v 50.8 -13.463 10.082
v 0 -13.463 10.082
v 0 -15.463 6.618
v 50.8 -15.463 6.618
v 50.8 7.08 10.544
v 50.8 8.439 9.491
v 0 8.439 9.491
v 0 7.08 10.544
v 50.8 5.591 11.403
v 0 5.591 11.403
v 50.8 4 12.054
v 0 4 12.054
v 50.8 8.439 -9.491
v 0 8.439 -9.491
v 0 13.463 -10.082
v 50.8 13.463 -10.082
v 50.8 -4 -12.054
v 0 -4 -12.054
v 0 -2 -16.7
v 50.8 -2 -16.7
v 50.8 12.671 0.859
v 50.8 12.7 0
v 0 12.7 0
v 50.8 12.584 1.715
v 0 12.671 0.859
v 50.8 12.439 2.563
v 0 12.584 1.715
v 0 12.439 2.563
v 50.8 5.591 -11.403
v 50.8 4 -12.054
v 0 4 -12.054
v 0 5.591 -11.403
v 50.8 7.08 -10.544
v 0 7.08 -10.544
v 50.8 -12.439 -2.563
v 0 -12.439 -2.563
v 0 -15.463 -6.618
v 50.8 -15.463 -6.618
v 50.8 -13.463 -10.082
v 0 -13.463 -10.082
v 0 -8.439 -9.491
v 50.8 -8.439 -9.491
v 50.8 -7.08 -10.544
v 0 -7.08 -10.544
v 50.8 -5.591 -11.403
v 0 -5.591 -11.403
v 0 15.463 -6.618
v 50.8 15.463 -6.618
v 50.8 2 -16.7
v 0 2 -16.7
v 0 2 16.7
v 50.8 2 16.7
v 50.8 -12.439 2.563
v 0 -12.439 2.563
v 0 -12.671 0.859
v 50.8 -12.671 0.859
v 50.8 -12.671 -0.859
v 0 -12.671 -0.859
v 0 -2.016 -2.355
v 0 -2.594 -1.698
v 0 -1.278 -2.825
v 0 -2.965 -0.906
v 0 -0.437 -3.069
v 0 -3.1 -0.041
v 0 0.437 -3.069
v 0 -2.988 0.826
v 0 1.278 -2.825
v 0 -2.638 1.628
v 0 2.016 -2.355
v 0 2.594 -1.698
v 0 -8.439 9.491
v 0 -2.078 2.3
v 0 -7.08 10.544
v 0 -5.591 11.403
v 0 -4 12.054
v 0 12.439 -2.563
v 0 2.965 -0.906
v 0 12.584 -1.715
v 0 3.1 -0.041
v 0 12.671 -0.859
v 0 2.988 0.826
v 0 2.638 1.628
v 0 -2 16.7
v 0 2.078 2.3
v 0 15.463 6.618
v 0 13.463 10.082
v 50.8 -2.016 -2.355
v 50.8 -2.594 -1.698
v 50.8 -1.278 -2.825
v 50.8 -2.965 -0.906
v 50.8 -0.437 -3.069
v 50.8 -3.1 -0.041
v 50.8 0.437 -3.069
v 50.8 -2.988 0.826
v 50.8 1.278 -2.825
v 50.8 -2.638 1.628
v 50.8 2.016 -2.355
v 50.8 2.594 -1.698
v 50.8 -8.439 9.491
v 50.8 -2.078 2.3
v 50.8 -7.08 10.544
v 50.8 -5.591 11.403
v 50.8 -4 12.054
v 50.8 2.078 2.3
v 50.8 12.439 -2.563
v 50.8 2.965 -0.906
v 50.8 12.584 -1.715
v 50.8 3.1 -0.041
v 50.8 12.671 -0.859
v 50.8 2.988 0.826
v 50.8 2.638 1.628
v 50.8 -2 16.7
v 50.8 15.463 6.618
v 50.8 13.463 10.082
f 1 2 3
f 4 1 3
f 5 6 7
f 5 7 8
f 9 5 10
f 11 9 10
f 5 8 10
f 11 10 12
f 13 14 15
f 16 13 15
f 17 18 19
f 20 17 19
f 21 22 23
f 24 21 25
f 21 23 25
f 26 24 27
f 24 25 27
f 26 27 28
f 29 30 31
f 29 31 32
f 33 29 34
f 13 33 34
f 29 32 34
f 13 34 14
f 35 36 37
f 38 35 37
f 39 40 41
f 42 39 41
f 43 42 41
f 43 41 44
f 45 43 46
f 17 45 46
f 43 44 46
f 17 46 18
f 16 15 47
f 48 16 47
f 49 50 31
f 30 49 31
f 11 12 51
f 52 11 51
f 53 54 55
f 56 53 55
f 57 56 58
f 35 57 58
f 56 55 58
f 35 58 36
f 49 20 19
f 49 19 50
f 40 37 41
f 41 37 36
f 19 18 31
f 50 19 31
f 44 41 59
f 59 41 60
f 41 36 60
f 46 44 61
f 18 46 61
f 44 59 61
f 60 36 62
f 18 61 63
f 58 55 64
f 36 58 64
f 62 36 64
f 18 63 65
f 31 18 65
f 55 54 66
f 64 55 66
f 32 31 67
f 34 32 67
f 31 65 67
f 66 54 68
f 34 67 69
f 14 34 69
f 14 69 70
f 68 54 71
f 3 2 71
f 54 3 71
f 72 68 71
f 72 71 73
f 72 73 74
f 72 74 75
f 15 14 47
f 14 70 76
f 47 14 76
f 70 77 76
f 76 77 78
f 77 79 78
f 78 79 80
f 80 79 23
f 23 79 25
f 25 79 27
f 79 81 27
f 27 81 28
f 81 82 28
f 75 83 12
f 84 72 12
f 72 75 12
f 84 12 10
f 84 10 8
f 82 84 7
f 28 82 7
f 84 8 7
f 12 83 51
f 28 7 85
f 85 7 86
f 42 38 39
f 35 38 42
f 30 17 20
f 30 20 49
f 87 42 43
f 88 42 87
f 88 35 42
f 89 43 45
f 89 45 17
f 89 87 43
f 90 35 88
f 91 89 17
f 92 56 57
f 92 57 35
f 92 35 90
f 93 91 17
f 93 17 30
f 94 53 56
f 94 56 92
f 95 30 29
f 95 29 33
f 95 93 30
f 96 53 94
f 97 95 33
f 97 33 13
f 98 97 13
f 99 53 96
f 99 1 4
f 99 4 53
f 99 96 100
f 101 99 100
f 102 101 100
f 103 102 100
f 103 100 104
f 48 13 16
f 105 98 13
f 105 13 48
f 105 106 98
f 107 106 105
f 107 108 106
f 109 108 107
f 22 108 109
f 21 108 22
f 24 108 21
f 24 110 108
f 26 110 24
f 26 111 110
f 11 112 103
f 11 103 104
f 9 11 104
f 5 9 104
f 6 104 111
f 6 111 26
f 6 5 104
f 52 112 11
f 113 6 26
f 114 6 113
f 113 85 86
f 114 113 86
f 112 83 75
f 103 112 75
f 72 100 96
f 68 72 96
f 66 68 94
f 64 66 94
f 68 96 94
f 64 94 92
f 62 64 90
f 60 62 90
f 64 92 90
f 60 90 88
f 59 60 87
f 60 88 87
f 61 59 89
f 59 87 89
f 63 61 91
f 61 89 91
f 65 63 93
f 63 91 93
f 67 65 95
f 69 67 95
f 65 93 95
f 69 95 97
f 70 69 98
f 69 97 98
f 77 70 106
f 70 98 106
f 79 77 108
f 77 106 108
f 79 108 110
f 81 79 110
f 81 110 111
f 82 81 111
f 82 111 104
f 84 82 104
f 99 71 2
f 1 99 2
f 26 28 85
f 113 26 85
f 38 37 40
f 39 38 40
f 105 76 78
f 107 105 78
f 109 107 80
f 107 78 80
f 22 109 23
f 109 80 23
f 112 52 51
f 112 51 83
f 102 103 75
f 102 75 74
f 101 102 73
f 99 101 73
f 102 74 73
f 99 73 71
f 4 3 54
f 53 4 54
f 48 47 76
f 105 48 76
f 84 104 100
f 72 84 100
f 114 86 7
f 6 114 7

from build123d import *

# Parameters (mm, degrees)
F1_DEPTH = 50.8
F3_DEPTH = 101.6


with BuildPart() as f1:
    # F0 (on Right) → F1 (new body)
    with BuildSketch(Plane.YZ):
        with BuildLine():
            ThreePointArc((12.43875, -2.562713), (12.634519, -1.287998), (12.7, 0))
            ThreePointArc((12.7, 0), (12.634519, 1.287998), (12.43875, 2.562713))
            ThreePointArc((12.43875, 2.562713), (10.998523, 6.35), (8.43875, 9.490917))
            ThreePointArc((8.43875, 9.490917), (6.35, 10.998523), (4, 12.05363))
            ThreePointArc((4, 12.05363), (0, 12.7), (-4, 12.05363))
            ThreePointArc((-4, 12.05363), (-6.35, 10.998523), (-8.43875, 9.490917))
            ThreePointArc((-8.43875, 9.490917), (-10.998523, 6.35), (-12.43875, 2.562713))
            ThreePointArc((-12.43875, 2.562713), (-12.7, 0), (-12.43875, -2.562713))
            ThreePointArc((-12.43875, -2.562713), (-10.998523, -6.35), (-8.43875, -9.490917))
            ThreePointArc((-8.43875, -9.490917), (-6.35, -10.998523), (-4, -12.05363))
            ThreePointArc((-4, -12.05363), (0, -12.7), (4, -12.05363))
            ThreePointArc((4, -12.05363), (6.35, -10.998523), (8.43875, -9.490917))
            ThreePointArc((8.43875, -9.490917), (10.998523, -6.35), (12.43875, -2.562713))
        make_face()
        with BuildLine():
            ThreePointArc((8.43875, 9.490917), (10.998523, 6.35), (12.43875, 2.562713))
            Line((12.43875, 2.562713), (15.462624, 6.617949))
            Line((15.462624, 6.617949), (14.462624, 8.35))
            Line((14.462624, 8.35), (13.462624, 10.082051))
            Line((13.462624, 10.082051), (8.43875, 9.490917))
        make_face()
        with BuildLine():
            Line((15.462624, -6.617949), (12.43875, -2.562713))
            ThreePointArc((12.43875, -2.562713), (10.998523, -6.35), (8.43875, -9.490917))
            Line((8.43875, -9.490917), (13.462624, -10.082051))
            Line((13.462624, -10.082051), (14.462624, -8.35))
            Line((14.462624, -8.35), (15.462624, -6.617949))
        make_face()
        with BuildLine():
            ThreePointArc((-4, 12.05363), (0, 12.7), (4, 12.05363))
            Line((4, 12.05363), (2, 16.7))
            Line((2, 16.7), (0, 16.7))
            Line((0, 16.7), (-2, 16.7))
            Line((-2, 16.7), (-4, 12.05363))
        make_face()
        with BuildLine():
            Line((2, -16.7), (4, -12.05363))
            ThreePointArc((4, -12.05363), (0, -12.7), (-4, -12.05363))
            Line((-4, -12.05363), (-2, -16.7))
            Line((-2, -16.7), (0, -16.7))
            Line((0, -16.7), (2, -16.7))
        make_face()
        with BuildLine():
            ThreePointArc((-12.43875, 2.562713), (-10.998523, 6.35), (-8.43875, 9.490917))
            Line((-8.43875, 9.490917), (-13.462624, 10.082051))
            Line((-13.462624, 10.082051), (-14.462624, 8.35))
            Line((-14.462624, 8.35), (-15.462624, 6.617949))
            Line((-15.462624, 6.617949), (-12.43875, 2.562713))
        make_face()
        with BuildLine():
            Line((-13.462624, -10.082051), (-8.43875, -9.490917))
            ThreePointArc((-8.43875, -9.490917), (-10.998523, -6.35), (-12.43875, -2.562713))
            Line((-12.43875, -2.562713), (-15.462624, -6.617949))
            Line((-15.462624, -6.617949), (-14.462624, -8.35))
            Line((-14.462624, -8.35), (-13.462624, -10.082051))
        make_face()
    extrude(amount=F1_DEPTH)

    # F2 (on face) → F3 (cut)
    with BuildSketch(Plane.YZ.offset(50.8)):
        with BuildLine():
            Line((2.077989, 2.300426), (-2.077989, 2.300426))
            ThreePointArc((-2.077989, 2.300426), (0, -3.1), (2.077989, 2.300426))
        make_face()
    extrude(amount=-F3_DEPTH, mode=Mode.SUBTRACT)


solid = f1.part
